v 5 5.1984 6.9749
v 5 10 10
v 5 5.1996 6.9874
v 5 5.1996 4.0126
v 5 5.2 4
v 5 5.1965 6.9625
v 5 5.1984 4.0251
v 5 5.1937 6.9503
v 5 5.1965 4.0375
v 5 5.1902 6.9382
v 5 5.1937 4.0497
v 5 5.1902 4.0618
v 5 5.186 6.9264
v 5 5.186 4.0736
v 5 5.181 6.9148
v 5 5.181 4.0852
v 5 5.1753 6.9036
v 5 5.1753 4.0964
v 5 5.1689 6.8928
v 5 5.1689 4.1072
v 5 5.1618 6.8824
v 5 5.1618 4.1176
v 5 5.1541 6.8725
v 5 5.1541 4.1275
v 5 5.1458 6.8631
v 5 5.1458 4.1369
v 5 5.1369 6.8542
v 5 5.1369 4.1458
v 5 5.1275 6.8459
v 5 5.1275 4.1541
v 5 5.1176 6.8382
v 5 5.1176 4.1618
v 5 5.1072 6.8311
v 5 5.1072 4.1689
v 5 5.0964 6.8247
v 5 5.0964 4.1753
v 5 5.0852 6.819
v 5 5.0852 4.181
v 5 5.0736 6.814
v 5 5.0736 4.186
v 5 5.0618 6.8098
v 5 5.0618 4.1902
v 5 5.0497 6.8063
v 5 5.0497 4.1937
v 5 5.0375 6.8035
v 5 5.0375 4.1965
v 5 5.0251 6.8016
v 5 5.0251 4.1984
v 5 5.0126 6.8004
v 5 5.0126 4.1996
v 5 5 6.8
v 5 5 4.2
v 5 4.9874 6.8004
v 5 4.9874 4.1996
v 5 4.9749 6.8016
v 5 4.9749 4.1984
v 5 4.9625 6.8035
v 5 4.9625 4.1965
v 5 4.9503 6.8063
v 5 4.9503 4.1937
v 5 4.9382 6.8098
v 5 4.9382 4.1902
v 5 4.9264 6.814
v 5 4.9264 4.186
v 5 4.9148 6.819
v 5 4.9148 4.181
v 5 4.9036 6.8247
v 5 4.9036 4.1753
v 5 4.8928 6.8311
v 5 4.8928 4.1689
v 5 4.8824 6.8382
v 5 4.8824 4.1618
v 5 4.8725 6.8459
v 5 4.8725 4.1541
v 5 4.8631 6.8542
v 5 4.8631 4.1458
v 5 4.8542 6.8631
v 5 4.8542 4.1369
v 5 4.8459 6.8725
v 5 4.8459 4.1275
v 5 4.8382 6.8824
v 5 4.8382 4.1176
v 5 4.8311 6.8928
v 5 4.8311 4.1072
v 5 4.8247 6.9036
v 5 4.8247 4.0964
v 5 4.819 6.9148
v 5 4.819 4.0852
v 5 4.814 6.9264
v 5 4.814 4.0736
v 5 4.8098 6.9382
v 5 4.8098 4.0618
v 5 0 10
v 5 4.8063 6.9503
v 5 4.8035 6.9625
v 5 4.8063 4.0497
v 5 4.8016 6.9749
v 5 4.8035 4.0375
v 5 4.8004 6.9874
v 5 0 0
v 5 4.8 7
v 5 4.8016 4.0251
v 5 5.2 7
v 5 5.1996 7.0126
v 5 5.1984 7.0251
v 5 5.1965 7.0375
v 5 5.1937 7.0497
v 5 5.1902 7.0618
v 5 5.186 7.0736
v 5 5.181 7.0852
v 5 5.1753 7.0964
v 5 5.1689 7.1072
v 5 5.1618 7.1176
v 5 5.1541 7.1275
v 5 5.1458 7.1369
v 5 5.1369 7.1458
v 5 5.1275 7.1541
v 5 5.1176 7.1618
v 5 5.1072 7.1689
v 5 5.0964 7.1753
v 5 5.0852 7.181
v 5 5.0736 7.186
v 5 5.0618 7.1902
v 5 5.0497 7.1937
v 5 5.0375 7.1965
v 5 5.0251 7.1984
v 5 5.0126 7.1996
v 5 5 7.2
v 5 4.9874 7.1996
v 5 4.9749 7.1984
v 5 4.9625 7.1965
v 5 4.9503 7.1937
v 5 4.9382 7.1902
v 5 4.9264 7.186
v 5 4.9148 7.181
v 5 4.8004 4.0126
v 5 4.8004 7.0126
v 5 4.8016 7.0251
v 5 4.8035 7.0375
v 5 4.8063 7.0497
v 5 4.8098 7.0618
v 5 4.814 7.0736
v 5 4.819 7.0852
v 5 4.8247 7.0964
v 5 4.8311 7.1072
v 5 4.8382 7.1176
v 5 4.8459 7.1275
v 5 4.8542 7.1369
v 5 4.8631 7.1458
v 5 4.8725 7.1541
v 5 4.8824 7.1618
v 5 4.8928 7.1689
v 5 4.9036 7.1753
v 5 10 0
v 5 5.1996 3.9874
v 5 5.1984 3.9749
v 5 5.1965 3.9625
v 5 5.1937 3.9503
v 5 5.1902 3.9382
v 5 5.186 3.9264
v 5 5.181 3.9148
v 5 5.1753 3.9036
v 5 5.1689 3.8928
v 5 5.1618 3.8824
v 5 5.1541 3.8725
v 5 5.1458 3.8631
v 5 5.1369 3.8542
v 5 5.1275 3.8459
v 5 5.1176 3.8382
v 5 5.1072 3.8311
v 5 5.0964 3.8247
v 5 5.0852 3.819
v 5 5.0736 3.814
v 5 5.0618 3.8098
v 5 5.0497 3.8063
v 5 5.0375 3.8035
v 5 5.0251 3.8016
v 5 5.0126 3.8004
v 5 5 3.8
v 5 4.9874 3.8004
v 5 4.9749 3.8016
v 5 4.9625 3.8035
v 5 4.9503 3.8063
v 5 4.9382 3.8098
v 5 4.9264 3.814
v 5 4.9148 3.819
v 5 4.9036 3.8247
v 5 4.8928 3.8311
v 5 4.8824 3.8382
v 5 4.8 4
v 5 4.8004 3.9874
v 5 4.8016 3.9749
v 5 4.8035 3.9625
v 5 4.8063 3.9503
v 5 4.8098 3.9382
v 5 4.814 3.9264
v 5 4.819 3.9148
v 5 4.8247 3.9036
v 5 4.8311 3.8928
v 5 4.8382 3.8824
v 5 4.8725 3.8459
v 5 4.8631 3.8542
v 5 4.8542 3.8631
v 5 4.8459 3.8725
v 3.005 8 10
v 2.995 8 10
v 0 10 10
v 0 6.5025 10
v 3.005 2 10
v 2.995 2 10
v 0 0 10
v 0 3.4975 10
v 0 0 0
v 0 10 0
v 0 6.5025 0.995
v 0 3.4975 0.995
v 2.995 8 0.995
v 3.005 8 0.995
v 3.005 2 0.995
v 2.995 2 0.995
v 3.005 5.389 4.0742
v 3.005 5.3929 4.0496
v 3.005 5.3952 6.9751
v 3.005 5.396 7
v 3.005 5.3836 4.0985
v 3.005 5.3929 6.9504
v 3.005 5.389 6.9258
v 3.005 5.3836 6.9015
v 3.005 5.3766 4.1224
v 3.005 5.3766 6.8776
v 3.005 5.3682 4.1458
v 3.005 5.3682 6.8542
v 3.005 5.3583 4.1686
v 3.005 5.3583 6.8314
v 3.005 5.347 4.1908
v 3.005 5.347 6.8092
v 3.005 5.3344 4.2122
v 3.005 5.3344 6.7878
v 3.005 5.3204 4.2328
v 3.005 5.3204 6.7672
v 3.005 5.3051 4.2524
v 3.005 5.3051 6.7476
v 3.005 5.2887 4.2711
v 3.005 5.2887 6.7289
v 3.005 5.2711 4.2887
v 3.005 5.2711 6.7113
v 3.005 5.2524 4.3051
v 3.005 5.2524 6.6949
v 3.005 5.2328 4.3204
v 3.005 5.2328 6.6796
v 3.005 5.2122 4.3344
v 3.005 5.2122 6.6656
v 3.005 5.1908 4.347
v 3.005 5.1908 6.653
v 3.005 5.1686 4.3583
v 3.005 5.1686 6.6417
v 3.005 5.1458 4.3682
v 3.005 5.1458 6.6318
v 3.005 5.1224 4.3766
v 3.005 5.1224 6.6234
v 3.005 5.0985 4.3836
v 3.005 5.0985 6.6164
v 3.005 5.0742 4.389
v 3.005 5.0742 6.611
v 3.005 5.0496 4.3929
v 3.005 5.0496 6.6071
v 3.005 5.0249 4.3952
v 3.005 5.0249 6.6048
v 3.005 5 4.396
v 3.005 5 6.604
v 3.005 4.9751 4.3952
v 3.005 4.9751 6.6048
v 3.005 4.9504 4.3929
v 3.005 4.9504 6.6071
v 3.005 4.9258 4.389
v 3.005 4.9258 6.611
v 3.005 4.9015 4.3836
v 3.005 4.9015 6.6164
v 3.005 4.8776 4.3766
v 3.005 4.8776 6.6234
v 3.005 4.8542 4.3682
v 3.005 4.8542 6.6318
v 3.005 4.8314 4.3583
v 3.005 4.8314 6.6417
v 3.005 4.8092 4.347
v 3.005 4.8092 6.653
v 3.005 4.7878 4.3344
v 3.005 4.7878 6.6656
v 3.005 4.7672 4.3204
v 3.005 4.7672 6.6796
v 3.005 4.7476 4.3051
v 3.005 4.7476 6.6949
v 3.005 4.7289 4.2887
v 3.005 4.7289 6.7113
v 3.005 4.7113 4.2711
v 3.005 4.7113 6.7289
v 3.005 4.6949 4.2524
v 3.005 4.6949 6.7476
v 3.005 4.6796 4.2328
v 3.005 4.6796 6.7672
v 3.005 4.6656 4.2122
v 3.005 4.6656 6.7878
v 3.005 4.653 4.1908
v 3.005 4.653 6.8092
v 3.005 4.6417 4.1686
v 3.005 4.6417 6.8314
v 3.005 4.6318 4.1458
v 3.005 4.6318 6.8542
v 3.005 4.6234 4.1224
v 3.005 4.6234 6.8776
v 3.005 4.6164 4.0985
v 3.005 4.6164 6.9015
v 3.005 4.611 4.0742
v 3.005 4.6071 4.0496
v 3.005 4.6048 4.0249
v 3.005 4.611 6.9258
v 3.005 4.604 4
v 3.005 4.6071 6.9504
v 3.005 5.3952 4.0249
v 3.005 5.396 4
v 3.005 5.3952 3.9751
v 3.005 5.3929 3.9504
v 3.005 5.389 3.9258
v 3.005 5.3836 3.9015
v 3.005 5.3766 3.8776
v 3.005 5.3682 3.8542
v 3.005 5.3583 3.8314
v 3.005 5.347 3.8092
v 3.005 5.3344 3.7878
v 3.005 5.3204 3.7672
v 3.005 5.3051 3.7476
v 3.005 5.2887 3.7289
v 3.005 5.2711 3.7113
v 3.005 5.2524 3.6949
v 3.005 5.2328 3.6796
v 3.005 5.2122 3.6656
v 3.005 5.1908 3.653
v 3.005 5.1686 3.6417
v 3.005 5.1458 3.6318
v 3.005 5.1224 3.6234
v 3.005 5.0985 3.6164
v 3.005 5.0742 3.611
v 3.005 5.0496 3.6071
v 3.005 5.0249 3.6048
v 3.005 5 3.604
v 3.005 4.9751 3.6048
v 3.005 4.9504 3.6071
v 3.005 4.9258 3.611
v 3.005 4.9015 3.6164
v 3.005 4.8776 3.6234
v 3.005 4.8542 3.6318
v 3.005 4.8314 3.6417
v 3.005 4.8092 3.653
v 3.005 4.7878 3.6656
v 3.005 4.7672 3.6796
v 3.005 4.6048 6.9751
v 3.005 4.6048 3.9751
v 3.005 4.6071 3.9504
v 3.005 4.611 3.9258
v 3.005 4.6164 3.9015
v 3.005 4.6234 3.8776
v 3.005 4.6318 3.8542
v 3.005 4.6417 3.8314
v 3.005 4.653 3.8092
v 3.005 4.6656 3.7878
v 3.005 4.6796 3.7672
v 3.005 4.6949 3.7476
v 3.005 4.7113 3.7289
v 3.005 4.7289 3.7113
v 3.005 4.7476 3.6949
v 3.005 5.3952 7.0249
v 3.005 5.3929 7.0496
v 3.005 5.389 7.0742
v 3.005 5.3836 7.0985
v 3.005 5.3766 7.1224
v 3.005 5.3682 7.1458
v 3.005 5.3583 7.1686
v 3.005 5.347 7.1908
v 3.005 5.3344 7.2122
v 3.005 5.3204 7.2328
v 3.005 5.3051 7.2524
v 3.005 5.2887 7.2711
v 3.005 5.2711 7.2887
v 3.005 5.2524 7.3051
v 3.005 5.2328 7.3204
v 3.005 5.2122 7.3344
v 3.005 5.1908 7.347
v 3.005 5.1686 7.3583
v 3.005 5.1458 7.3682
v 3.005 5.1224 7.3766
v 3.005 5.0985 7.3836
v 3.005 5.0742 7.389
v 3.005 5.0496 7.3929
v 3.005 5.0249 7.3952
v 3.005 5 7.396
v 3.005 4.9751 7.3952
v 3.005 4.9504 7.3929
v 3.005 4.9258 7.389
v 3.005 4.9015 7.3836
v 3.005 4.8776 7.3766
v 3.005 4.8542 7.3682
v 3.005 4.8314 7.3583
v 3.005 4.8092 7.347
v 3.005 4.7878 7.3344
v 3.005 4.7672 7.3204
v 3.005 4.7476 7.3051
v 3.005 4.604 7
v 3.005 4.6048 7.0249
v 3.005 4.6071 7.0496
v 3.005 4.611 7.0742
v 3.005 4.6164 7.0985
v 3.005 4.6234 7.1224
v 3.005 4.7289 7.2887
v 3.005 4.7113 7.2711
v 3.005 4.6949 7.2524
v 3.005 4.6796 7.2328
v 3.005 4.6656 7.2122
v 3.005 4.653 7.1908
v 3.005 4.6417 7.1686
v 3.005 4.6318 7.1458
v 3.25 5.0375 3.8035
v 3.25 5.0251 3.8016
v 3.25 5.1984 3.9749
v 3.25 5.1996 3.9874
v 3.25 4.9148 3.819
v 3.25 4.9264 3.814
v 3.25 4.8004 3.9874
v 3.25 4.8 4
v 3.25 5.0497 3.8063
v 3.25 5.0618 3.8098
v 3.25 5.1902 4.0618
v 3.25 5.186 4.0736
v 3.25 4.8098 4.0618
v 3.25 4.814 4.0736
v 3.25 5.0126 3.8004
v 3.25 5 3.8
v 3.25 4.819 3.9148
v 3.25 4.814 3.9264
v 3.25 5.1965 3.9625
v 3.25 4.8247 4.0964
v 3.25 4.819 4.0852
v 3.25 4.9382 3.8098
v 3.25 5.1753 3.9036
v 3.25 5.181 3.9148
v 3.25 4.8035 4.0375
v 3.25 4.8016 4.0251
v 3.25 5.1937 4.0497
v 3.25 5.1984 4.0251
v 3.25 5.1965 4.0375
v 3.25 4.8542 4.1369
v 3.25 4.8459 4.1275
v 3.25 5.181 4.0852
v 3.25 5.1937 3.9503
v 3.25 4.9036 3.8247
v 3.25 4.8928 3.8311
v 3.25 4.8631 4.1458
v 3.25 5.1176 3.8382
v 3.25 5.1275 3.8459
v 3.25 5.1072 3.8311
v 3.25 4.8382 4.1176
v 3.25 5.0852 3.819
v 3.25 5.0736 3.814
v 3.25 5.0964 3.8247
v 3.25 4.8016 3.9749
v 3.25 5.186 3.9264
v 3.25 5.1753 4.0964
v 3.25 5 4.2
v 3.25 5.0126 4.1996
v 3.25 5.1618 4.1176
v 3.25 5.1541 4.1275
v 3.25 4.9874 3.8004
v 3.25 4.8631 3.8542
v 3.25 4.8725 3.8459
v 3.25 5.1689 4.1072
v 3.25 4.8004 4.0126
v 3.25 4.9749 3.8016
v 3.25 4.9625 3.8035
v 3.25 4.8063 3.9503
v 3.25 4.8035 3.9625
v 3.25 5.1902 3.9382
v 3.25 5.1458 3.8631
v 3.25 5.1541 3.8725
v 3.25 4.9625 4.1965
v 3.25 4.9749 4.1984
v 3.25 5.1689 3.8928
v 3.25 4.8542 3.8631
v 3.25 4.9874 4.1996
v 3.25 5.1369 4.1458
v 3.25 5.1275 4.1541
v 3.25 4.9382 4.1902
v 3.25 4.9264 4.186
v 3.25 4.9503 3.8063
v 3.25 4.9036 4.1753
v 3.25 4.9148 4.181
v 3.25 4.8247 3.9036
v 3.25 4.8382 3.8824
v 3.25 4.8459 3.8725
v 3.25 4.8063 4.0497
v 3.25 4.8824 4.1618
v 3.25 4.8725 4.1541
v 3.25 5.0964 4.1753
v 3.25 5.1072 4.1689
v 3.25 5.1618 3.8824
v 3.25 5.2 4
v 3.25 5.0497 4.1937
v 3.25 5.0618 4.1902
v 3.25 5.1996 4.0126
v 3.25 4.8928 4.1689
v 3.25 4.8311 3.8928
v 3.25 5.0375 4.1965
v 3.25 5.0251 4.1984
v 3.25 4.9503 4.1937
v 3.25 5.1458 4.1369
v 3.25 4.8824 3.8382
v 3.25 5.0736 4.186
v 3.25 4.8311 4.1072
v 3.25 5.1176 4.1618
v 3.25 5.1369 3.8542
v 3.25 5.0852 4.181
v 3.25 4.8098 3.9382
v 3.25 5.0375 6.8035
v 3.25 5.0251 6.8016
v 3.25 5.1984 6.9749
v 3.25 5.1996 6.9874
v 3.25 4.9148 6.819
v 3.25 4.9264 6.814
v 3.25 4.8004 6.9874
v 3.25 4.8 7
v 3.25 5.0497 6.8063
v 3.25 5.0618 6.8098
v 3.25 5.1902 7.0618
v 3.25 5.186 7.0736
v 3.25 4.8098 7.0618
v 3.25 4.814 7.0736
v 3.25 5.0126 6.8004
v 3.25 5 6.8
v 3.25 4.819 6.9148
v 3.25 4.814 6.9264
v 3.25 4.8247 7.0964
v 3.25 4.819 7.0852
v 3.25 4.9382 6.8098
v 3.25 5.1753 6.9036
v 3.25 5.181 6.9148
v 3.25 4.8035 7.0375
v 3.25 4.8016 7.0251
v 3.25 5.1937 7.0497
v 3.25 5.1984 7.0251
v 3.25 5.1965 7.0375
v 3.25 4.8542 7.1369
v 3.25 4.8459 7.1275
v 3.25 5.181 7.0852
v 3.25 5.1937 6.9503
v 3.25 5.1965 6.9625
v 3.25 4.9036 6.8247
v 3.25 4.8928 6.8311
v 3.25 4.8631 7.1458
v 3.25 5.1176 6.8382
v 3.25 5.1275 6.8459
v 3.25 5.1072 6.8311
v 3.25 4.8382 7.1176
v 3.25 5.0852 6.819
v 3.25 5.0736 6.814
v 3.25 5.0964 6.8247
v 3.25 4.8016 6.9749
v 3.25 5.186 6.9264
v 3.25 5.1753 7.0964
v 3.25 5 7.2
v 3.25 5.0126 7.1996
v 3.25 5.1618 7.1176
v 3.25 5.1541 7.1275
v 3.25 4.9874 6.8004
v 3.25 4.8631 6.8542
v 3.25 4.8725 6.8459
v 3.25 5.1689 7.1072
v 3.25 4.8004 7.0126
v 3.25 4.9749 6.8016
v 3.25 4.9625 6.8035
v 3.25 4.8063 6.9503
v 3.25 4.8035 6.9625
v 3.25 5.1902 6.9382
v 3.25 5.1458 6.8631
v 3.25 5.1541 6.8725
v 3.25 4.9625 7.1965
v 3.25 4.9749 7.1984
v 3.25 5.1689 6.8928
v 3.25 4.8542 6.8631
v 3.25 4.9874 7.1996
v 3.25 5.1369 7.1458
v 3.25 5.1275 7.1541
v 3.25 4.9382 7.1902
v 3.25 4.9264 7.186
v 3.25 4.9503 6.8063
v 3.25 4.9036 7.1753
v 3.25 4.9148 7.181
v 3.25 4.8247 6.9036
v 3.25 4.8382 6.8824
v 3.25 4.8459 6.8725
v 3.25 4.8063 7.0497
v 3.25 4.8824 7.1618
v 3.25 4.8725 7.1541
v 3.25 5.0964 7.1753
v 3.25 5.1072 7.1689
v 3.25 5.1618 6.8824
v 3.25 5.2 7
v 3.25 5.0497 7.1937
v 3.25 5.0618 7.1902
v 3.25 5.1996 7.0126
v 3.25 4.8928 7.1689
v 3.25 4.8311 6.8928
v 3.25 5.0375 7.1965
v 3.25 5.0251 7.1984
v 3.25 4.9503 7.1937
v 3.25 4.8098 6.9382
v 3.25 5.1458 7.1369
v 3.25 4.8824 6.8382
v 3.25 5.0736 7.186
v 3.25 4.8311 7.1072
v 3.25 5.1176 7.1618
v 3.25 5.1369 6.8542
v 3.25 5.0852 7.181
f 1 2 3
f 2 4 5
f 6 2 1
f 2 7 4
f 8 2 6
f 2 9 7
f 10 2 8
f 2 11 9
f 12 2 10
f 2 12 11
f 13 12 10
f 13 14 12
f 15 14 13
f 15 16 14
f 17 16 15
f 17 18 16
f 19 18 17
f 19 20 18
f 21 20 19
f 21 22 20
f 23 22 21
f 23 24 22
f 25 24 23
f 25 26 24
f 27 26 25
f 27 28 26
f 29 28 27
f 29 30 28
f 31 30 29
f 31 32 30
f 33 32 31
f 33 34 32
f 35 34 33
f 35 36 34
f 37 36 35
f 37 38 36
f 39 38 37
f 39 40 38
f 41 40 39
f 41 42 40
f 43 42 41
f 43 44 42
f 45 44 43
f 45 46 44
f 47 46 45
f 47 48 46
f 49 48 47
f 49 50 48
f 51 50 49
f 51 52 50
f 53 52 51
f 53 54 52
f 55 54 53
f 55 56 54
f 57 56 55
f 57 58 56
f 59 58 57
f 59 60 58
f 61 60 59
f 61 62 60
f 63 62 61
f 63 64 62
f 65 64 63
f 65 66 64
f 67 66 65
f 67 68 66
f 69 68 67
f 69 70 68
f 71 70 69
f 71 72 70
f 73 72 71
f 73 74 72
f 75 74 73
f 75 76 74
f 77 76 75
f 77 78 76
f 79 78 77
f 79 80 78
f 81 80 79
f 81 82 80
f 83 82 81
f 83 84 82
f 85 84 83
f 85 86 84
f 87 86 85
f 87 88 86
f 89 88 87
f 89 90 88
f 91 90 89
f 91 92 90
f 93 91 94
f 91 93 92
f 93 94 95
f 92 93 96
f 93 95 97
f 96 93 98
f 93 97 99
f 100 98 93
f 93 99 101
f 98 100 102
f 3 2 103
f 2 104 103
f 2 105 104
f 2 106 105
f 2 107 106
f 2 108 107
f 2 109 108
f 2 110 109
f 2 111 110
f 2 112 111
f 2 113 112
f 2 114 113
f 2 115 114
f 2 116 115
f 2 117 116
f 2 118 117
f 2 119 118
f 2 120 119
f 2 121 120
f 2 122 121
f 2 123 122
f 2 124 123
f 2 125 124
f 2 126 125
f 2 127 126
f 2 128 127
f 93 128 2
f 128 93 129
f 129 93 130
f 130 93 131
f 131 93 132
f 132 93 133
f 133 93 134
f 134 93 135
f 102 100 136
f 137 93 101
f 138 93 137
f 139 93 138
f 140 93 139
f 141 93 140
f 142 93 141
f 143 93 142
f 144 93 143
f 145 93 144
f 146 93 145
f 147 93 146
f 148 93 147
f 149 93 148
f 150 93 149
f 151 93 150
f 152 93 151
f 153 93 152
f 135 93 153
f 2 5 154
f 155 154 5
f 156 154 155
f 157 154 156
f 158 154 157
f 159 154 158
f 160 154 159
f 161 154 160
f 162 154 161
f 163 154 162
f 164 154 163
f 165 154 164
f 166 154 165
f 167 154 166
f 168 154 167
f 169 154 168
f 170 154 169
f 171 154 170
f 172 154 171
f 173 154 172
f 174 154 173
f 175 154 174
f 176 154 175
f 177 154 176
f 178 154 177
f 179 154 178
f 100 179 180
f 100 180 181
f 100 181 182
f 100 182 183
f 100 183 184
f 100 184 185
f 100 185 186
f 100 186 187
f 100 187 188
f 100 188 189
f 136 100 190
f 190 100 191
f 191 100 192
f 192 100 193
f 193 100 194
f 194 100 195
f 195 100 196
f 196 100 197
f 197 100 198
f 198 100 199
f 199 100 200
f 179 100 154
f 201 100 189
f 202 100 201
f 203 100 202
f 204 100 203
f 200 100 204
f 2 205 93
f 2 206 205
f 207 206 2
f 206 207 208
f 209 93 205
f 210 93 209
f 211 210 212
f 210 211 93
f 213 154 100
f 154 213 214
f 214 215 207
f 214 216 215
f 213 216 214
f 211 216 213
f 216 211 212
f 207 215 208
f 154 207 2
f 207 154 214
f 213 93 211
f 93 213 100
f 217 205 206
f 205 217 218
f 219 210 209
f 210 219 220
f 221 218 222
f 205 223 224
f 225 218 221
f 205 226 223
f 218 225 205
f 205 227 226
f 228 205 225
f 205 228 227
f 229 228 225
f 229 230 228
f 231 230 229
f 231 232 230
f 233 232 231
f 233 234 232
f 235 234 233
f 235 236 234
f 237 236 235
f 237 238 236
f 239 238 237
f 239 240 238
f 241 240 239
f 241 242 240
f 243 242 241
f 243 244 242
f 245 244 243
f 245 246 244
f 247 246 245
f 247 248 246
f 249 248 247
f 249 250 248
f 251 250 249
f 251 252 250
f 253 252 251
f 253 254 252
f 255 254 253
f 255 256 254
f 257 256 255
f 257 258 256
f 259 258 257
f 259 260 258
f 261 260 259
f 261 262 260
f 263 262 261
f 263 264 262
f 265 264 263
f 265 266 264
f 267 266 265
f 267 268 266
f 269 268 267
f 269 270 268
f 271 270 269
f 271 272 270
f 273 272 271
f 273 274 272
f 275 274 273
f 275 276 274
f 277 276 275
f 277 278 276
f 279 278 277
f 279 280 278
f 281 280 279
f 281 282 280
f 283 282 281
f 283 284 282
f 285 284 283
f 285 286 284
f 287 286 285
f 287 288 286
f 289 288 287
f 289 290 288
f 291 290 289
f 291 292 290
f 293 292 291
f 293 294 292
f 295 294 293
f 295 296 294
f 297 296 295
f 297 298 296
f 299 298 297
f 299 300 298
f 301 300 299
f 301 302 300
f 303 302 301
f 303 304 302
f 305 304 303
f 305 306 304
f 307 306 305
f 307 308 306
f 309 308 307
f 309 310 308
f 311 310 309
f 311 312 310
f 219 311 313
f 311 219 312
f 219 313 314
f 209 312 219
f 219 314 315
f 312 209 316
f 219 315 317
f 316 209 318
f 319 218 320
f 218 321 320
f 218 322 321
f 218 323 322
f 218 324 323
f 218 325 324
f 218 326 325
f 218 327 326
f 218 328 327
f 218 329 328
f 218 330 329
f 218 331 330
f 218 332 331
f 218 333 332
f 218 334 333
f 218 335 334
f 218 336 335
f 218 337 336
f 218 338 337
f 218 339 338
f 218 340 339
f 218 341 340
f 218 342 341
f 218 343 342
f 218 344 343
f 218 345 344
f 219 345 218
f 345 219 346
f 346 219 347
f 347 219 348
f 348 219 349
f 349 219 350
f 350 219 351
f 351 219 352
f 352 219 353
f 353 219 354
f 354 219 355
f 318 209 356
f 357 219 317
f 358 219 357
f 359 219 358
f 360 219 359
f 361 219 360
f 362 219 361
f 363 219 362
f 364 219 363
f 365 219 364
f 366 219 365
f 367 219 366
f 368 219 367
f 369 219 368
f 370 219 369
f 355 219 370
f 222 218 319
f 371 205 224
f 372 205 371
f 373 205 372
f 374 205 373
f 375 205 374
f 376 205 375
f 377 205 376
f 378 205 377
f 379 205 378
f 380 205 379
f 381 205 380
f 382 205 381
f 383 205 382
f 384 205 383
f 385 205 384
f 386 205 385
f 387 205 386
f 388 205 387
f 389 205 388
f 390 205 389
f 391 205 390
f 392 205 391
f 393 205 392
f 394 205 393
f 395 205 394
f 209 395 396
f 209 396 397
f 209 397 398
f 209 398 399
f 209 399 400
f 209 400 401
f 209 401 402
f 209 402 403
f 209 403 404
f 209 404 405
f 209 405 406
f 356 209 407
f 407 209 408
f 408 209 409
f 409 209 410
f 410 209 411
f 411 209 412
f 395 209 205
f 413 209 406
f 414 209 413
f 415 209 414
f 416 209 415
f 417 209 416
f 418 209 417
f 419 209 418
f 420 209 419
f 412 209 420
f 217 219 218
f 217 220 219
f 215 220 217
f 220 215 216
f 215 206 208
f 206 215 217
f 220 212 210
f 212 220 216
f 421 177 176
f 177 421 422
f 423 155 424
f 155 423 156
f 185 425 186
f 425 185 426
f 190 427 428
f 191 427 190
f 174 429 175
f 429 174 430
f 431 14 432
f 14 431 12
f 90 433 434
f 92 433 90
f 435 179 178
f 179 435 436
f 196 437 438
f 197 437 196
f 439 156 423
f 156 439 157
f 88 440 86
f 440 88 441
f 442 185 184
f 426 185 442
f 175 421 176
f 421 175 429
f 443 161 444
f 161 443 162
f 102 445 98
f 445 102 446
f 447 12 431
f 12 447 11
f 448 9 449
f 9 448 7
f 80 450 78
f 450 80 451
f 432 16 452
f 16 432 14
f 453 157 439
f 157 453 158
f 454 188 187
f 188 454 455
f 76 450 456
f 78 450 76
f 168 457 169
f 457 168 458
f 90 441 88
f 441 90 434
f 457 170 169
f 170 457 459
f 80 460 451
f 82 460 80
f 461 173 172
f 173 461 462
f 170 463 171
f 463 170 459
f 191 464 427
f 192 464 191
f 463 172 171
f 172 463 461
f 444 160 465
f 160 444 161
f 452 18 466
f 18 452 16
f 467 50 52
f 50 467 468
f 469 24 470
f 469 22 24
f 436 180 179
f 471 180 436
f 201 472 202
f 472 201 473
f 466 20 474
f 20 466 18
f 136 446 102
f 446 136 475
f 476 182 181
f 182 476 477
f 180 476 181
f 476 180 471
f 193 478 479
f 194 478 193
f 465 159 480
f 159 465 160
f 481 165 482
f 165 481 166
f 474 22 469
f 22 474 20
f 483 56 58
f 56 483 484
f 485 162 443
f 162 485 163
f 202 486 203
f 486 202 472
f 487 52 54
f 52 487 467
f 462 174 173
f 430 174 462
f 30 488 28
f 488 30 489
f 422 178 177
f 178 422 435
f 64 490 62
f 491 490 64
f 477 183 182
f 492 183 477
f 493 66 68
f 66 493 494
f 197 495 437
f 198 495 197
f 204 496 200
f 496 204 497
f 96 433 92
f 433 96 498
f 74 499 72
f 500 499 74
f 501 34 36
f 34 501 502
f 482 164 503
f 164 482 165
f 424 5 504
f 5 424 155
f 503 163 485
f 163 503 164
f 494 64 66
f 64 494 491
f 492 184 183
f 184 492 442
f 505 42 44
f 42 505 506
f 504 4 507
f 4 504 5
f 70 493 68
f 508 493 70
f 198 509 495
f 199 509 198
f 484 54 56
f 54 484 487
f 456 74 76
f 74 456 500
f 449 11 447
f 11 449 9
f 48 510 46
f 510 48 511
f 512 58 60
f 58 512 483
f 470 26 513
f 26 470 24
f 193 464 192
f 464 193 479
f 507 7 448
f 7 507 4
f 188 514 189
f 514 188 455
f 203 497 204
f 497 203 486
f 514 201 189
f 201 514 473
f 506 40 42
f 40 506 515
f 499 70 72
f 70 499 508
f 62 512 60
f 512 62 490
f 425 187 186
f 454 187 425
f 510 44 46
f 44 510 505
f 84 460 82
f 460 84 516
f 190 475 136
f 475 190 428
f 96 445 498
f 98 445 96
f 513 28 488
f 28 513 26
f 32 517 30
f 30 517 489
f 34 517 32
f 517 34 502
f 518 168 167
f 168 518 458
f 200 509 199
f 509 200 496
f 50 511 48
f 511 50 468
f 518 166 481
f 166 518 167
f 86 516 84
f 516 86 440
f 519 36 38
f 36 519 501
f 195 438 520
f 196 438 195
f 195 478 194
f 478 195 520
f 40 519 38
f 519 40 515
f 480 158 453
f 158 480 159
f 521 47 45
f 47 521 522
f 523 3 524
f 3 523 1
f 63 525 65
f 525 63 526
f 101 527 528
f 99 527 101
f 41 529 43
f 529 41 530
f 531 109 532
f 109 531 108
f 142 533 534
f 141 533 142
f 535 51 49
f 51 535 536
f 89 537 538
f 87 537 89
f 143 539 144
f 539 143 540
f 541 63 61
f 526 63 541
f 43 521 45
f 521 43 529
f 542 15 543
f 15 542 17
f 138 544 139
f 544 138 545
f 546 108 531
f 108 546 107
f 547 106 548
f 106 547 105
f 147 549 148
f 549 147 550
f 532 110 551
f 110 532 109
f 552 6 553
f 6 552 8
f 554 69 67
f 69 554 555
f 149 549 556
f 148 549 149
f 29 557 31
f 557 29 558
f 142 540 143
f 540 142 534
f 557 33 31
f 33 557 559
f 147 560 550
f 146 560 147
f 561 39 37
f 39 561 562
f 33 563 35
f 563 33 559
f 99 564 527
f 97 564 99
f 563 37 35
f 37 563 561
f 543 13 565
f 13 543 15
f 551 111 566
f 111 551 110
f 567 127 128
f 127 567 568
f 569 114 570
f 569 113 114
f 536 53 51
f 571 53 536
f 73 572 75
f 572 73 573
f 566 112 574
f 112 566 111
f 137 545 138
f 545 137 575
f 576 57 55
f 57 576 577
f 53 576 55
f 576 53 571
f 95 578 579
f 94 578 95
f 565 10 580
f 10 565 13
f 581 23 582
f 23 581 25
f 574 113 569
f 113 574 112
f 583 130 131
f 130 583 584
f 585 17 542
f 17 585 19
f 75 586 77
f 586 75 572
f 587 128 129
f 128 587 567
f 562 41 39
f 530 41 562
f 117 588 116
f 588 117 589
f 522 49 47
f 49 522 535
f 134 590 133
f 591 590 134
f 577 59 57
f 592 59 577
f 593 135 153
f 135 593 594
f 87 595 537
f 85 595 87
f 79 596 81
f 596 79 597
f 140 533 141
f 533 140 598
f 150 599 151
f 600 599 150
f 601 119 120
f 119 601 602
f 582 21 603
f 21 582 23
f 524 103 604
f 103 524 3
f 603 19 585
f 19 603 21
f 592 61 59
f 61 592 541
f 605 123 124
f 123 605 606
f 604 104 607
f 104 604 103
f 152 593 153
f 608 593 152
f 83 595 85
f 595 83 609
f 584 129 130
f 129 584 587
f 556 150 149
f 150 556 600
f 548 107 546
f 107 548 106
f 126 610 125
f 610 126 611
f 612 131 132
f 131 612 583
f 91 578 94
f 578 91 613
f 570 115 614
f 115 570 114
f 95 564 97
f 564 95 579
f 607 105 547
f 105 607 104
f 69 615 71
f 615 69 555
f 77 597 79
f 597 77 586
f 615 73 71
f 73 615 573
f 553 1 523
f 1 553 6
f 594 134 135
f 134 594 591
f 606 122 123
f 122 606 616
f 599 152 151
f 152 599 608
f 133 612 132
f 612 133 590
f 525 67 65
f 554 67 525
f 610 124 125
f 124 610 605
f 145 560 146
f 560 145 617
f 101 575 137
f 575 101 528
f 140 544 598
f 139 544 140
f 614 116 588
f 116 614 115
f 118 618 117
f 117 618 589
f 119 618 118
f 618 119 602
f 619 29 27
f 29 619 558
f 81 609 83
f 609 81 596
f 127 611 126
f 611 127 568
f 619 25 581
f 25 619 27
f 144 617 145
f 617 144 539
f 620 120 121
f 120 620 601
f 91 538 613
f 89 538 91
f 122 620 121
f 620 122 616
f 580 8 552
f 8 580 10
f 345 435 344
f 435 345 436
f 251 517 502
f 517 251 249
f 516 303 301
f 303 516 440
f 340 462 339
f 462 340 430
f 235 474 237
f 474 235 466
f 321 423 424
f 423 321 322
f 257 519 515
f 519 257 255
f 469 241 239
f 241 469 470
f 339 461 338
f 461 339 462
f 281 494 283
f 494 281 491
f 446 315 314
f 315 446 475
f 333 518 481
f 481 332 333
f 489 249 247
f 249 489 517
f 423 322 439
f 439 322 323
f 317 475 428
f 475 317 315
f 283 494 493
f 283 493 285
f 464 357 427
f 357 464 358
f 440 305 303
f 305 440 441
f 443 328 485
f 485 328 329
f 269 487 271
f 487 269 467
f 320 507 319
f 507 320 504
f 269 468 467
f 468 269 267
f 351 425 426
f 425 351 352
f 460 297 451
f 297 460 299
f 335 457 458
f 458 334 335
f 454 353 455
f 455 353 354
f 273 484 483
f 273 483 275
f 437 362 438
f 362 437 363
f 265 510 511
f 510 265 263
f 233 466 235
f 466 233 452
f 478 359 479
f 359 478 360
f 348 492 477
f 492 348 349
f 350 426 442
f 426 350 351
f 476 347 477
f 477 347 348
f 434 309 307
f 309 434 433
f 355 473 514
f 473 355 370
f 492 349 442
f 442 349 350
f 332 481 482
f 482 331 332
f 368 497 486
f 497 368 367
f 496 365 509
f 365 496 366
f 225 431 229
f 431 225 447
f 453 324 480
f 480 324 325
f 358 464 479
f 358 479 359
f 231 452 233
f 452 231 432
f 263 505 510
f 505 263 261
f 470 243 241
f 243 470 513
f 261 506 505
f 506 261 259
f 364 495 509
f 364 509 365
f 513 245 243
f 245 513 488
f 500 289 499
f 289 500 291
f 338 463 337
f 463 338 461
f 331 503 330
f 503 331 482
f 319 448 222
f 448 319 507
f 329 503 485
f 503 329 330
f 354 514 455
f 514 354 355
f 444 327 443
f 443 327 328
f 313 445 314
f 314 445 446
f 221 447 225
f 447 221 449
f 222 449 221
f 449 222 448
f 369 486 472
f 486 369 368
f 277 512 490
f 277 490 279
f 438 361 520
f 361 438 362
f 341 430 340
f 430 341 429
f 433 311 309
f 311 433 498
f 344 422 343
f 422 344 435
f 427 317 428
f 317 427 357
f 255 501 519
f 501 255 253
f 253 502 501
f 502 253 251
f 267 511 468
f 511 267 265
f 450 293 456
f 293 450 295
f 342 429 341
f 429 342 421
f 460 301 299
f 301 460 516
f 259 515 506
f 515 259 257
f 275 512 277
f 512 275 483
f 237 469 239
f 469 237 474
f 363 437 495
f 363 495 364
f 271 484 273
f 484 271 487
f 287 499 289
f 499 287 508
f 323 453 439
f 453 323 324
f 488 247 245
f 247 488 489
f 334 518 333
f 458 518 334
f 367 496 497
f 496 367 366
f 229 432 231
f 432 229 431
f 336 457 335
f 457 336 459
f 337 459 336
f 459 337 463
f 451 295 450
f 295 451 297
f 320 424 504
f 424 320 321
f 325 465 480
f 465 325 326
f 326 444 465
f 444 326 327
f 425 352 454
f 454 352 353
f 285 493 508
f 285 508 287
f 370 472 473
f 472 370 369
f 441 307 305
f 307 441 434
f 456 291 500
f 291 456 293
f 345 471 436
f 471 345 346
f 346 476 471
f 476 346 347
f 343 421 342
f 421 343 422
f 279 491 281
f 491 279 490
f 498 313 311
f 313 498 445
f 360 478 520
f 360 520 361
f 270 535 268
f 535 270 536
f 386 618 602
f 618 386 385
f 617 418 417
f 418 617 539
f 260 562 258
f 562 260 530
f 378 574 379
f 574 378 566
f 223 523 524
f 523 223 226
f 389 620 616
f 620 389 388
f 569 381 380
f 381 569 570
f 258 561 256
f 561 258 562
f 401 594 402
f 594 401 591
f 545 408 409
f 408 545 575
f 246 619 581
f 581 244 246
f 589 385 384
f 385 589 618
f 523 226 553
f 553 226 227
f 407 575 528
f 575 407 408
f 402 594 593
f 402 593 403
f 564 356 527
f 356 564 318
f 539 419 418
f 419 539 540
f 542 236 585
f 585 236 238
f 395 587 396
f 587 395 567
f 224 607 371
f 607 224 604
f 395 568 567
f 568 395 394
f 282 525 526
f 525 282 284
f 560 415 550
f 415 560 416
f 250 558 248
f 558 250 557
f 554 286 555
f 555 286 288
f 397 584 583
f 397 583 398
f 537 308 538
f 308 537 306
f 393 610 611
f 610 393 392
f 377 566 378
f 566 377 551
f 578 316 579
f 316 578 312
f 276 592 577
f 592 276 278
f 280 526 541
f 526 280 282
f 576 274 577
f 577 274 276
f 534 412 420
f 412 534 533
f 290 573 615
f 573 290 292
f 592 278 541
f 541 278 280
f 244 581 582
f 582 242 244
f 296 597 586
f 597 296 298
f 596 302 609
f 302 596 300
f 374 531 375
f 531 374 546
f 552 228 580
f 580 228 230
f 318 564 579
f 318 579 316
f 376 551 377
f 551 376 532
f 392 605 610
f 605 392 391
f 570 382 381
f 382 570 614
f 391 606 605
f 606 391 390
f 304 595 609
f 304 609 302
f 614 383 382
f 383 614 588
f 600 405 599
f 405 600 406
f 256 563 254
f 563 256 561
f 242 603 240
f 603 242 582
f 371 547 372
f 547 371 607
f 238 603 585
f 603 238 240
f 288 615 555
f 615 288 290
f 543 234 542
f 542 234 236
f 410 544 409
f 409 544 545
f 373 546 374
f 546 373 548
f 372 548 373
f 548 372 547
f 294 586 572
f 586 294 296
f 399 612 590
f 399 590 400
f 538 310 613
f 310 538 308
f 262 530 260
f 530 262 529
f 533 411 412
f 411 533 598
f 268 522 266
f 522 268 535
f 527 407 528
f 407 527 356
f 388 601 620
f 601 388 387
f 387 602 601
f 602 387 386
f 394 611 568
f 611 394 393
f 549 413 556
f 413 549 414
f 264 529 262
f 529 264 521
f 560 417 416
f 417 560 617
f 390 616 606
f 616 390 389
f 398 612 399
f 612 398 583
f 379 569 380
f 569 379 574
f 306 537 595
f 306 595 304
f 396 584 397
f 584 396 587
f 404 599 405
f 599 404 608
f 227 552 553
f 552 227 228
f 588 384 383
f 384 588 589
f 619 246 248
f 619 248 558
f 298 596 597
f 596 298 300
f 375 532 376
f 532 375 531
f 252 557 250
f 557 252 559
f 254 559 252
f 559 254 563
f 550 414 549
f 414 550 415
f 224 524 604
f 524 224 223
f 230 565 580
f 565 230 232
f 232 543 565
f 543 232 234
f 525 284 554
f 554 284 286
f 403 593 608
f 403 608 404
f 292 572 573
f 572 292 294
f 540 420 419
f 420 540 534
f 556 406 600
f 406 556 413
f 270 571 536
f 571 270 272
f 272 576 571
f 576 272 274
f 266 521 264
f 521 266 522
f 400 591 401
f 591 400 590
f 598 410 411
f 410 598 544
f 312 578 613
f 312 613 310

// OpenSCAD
module doveTailMount(length, width, height, depth, mountWidth, insetDepth, bottomSupportWidth) {
    difference() {
        cube([length, width, height]);
        translate([0, width/2, ((height-bottomSupportWidth)/2)+bottomSupportWidth]) hull() {
            cube([0.01, mountWidth, height-bottomSupportWidth+0.01], center=true);
            translate([insetDepth, 0,0]) cube([0.01, mountWidth+insetDepth, height-bottomSupportWidth+0.01], center=true);
        }
    }
}

$fn=100;
 
module doveTailMountWithScrewHoles(length, width, height, depth, mountWidth, insetDepth, bottomSupportWidth, screwRadius) {
    let (remainingHeight=height-bottomSupportWidth)
    {
        difference() {
            doveTailMount(length, width, height, depth, mountWidth, insetDepth, bottomSupportWidth);
            translate([0, width/2, bottomSupportWidth+remainingHeight/3]) rotate([0,90,0]) cylinder(r=screwRadius, h=length+0.01);
            translate([0, width/2, bottomSupportWidth+remainingHeight/3+remainingHeight/3]) rotate([0,90,0]) cylinder(r=screwRadius, h=length+0.01);
            translate([insetDepth, width/2, bottomSupportWidth+remainingHeight/3]) rotate([0,90,0]) cylinder(r1=screwRadius+0.2, r2=0, h=0.5);
            translate([insetDepth, width/2, bottomSupportWidth+remainingHeight/3+remainingHeight/3]) rotate([0,90,0]) cylinder(r1=screwRadius+0.2, r2=0, h=0.5);
            
        }
    }
}

doveTailMountWithScrewHoles(5,10,10,3,3,3,1, 0.2);
